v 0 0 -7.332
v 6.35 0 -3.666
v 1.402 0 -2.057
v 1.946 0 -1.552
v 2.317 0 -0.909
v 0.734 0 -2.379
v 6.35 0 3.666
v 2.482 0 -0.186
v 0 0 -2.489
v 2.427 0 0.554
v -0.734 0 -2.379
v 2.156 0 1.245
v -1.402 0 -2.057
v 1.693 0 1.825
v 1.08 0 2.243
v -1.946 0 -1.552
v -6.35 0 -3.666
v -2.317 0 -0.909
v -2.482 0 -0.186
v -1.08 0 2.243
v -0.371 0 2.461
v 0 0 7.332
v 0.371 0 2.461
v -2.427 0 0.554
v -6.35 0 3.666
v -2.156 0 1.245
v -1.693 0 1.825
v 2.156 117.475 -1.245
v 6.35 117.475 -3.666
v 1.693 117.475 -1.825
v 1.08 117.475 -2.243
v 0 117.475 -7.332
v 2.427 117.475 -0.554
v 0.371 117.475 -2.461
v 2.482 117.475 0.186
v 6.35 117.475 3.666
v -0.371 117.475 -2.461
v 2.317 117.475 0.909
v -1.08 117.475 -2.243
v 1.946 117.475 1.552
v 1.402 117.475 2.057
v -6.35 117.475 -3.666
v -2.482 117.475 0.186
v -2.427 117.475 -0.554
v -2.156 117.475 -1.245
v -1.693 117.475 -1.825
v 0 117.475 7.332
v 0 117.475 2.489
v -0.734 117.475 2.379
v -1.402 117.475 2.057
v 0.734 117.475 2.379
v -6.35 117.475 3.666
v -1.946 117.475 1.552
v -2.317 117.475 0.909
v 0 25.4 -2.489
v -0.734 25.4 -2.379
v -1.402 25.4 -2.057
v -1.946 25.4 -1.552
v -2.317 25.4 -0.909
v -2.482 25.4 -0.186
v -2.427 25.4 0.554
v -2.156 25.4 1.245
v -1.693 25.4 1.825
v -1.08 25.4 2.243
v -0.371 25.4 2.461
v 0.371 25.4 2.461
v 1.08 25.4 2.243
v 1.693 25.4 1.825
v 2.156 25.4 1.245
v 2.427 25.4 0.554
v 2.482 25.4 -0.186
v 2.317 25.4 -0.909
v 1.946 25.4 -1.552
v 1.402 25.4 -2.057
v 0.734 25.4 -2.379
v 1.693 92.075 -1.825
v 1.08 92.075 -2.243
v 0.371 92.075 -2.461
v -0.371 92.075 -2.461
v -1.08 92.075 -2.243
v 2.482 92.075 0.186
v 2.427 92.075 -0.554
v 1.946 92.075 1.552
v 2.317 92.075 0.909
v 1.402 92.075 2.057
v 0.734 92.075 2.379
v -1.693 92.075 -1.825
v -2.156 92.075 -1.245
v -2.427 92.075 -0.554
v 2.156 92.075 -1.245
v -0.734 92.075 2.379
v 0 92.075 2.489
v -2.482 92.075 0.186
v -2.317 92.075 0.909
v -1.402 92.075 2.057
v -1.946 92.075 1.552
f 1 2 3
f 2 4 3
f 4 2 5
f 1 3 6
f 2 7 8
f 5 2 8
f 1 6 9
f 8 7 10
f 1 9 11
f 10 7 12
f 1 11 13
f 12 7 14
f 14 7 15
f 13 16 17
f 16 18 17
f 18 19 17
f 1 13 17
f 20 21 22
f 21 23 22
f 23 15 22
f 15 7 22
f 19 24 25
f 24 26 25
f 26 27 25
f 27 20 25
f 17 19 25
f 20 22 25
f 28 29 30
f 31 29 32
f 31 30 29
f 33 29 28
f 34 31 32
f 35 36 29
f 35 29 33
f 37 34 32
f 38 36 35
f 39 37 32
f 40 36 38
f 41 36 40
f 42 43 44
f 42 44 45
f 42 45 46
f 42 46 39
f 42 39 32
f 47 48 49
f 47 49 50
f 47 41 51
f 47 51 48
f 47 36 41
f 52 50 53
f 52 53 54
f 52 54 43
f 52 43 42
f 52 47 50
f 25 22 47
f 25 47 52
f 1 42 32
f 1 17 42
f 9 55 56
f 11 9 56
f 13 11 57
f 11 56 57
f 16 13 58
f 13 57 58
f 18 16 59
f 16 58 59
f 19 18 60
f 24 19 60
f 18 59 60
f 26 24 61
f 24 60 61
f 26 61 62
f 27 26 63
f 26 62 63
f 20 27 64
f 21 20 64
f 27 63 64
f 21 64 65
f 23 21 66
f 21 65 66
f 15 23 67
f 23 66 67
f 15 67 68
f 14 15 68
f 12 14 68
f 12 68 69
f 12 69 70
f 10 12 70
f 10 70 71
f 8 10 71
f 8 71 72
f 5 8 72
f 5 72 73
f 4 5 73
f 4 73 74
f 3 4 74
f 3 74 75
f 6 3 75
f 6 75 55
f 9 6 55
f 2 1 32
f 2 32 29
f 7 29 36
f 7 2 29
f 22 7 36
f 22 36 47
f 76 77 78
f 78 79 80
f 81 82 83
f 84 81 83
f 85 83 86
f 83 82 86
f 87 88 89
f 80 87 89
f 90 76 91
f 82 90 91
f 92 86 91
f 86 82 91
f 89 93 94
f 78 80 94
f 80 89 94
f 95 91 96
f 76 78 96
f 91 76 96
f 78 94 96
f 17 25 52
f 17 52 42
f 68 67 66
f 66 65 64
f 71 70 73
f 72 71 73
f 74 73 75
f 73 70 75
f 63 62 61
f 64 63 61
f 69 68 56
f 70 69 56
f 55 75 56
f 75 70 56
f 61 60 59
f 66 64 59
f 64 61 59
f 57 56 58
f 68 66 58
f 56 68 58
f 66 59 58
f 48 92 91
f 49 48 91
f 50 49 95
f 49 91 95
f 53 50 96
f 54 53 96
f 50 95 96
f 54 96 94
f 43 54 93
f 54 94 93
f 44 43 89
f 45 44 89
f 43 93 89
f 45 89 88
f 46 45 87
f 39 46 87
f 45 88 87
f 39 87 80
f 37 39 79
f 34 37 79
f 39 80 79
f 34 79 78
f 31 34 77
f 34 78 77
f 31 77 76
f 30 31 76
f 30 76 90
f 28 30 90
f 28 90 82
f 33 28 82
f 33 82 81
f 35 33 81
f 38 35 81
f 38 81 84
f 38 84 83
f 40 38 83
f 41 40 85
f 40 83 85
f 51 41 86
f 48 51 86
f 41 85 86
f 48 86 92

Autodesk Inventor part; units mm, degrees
ref_plane "YZ Plane" through (0, 0, 0) normal (1, 0, 0) x (0, 1, 0)
ref_plane "XZ Plane" through (0, 0, 0) normal (0, 1, 0) x (-1, 0, 0)
ref_plane "XY Plane" through (0, 0, 0) normal (0, 0, 1) x (1, 0, 0)
sketch "Sketch1" plane through (0, 0, 0) normal (0, 1, 0) x (-1, 0, 0)
  line L0 (6.35, -3.6662) -> (0, -7.3323)
  line L1 (0, -7.3323) -> (-6.35, -3.6662)
  line L2 (-6.35, -3.6662) -> (-6.35, 3.6662)
  line L3 (-6.35, 3.6662) -> (0, 7.3323)
  line L4 (0, 7.3323) -> (6.35, 3.6662)
  line L5 (6.35, 3.6662) -> (6.35, -3.6662)
  point P0 (0, 0)
  point P1 (0, 0)
  point P2 (0, 0)
  dimension "d0" = 12.7
extrude "Extrusion1" add sketch "Sketch1" along normal blind 117.475
sketch "Sketch2" plane through (0, 0, 0) normal (0, -1, 0) x (1, 0, 0)
  point P0 (0, 0)
  point P1 (0, 0)
hole "Hole1" at (0, 0, 0) direction (0, 1, 0) diameter 4.9784 depth 25.4 thread size "1/4-20 UNC" class "2B" standard "ANSI Unified Screw Threads"
sketch "Sketch3" plane through (0, 117.475, 0) normal (0, 1, 0) x (1, 0, 0)
  point P0 (0, 0)
  point P1 (0, 0)
hole "Hole2" at (0, 117.475, 0) direction (0, -1, 0) diameter 4.9784 depth 25.4 thread size "1/4-20 UNC" class "2B" standard "ANSI Unified Screw Threads"
properties part number "SHOT_1_009_HexShaft4" material "Aluminum 6061"
